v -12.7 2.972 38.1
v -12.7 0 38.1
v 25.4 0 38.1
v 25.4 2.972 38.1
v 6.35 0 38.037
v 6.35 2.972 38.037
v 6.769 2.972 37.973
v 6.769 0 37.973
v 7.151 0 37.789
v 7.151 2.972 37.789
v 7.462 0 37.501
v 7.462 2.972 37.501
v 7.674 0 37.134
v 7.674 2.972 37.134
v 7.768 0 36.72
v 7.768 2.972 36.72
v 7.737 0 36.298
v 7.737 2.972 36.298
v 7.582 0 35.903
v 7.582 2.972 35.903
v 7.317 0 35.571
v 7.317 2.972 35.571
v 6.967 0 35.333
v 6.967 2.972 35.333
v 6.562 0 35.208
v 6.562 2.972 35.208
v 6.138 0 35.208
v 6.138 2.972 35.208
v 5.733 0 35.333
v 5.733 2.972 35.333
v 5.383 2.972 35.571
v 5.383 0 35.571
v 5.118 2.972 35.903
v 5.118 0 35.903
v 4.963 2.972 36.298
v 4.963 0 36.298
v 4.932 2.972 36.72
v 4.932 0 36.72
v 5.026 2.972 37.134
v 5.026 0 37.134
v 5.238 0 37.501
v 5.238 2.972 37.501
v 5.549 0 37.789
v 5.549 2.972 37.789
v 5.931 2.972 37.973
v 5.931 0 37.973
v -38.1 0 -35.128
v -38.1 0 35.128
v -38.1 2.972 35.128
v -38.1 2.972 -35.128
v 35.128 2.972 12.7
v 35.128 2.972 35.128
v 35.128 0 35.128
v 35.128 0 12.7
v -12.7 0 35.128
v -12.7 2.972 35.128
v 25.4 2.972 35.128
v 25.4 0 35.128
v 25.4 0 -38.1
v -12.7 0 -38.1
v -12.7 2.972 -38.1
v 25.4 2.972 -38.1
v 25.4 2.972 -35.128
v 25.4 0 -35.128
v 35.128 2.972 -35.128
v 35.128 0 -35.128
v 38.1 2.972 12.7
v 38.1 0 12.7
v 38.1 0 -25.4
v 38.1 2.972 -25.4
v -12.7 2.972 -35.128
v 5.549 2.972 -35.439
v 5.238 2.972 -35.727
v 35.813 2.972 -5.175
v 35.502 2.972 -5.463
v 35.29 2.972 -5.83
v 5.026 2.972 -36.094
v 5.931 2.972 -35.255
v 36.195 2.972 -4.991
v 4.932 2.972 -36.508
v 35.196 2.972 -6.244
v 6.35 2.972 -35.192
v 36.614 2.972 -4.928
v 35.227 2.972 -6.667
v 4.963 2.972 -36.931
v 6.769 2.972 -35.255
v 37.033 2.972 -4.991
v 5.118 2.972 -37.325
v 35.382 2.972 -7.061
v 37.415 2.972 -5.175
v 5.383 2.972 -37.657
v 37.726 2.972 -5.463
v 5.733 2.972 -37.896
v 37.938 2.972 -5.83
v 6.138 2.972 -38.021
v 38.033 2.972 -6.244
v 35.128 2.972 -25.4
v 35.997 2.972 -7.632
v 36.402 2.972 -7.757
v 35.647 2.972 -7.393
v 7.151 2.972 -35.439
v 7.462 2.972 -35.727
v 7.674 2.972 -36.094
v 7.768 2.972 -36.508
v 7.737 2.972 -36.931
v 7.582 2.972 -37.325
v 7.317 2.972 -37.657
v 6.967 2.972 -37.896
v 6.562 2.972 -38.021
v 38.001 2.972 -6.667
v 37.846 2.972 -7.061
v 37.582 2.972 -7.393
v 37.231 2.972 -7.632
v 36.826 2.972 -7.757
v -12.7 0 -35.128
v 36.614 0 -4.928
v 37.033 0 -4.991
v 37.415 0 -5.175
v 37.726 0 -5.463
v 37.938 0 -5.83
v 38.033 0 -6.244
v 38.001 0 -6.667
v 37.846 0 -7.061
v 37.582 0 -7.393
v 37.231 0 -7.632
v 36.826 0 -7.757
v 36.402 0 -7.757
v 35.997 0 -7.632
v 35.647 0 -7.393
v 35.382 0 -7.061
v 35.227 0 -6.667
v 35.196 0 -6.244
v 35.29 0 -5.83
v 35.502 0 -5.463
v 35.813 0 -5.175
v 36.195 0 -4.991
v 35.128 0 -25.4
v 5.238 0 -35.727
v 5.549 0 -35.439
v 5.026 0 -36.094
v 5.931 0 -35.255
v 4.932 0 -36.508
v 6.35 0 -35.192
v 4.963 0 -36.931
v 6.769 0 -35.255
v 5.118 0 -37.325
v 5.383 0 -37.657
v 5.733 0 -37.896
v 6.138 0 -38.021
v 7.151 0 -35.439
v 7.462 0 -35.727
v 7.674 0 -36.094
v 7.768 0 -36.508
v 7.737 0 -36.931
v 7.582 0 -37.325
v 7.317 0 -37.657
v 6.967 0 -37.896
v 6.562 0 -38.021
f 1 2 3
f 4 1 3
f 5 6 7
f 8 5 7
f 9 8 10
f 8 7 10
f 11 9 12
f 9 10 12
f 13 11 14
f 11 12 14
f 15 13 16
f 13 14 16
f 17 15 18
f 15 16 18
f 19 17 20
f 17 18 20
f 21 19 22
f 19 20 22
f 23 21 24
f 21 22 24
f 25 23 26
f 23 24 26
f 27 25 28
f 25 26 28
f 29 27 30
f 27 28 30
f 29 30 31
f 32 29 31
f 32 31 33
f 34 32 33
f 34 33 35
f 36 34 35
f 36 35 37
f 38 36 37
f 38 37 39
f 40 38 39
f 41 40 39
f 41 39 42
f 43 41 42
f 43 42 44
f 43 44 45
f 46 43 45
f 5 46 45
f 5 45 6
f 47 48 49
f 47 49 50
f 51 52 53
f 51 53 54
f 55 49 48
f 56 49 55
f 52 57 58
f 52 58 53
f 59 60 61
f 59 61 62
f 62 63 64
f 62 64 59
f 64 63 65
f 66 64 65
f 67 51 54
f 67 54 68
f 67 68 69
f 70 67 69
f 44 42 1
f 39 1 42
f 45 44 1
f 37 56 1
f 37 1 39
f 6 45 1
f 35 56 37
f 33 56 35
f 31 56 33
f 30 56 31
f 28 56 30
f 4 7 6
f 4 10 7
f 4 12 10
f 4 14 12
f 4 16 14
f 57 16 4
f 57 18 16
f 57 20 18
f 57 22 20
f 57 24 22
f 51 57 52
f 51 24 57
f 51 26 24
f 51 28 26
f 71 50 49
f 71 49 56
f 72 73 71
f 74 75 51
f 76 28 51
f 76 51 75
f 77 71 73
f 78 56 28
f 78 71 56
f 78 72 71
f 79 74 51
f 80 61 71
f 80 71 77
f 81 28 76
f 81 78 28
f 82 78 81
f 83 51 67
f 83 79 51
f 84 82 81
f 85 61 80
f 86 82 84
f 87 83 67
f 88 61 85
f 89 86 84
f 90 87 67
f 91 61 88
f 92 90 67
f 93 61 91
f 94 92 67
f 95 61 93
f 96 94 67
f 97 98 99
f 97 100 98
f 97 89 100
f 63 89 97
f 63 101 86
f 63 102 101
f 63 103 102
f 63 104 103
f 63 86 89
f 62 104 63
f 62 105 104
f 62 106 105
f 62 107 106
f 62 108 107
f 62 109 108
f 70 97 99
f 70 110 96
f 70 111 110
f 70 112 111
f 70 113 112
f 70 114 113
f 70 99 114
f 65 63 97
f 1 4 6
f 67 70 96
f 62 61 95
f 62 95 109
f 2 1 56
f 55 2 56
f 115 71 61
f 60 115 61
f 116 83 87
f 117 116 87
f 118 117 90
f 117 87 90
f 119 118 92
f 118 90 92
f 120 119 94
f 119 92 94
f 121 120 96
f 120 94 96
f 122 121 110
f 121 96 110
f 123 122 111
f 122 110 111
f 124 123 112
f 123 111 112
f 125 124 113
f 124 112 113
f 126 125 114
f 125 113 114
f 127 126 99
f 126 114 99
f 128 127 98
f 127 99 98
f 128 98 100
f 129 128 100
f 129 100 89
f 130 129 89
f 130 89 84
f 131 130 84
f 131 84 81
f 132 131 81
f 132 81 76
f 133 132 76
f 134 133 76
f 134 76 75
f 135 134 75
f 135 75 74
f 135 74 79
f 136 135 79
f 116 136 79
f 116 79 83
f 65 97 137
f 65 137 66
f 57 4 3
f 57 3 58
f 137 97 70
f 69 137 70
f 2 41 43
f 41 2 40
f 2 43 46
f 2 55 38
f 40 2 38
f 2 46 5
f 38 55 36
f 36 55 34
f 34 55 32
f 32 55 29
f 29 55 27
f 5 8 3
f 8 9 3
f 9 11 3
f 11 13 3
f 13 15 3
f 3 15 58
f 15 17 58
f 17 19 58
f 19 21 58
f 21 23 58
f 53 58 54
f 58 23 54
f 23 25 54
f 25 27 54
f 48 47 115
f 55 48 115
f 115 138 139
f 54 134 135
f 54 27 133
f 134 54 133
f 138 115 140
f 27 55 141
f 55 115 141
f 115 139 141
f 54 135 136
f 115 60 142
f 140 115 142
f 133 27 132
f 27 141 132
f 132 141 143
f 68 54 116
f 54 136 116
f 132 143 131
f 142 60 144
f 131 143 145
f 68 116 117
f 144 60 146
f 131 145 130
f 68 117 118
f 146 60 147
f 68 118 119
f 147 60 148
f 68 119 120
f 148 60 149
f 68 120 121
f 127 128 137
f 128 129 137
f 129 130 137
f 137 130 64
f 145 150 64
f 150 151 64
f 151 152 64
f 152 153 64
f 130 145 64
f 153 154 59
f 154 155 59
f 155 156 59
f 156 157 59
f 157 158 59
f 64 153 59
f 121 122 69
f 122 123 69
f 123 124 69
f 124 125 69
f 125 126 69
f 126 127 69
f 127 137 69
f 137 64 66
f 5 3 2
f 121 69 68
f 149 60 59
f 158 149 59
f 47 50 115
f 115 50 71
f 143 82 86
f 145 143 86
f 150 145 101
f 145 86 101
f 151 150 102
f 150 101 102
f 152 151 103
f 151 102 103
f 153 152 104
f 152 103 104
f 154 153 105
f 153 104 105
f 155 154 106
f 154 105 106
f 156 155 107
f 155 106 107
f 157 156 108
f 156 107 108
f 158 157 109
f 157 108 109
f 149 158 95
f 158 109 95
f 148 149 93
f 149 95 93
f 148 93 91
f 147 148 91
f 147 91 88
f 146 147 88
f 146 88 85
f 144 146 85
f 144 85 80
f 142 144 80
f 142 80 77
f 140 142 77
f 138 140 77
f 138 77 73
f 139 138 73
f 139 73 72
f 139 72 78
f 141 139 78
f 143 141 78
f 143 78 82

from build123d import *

# Parameters (mm, degrees)
SKETCH1_W           = 76.2
SKETCH1_H           = 76.2
BOSS_EXTRUDE1_DEPTH = 2.9718
SKETCH2_W           = 25.4
SKETCH2_H           = 2.9718
SKETCH2_W_2         = 12.7
SKETCH2_W_3         = 2.9718
SKETCH2_H_2         = 12.7
SKETCH2_H_3         = 25.4
SKETCH2_R           = 1.4224
CUT_EXTRUDE1_DEPTH  = 54.963428313


with BuildPart() as part:
    # Sketch1 → Boss-Extrude1 (new body)
    with BuildSketch(Plane(origin=(0, 0, 0), x_dir=(1, 0, 0), z_dir=(0, 1, 0))):
        Rectangle(SKETCH1_W, SKETCH1_H)
    extrude(amount=BOSS_EXTRUDE1_DEPTH)

    # Sketch2 → Cut-Extrude1 (cut, through all)
    with BuildSketch(Plane(origin=(0, 2.9718, 0), x_dir=(1, 0, 0), z_dir=(0, 1, 0))):
        with Locations((-25.4, 36.6141)):
            Rectangle(SKETCH2_W, SKETCH2_H)
        with Locations((31.75, 36.6141)):
            Rectangle(SKETCH2_W_2, SKETCH2_H)
        with Locations((36.6141, 31.75)):
            Rectangle(SKETCH2_W_3, SKETCH2_H_2)
        with Locations((36.6141, -25.4)):
            Rectangle(SKETCH2_W_3, SKETCH2_H_3)
        with Locations(Location((36.6141, 6.35, 0), (0, 0, 270))):
            Circle(SKETCH2_R)
        with Locations(Location((6.35, 36.6141, 0), (0, 0, 270))):
            Circle(SKETCH2_R)
        with Locations((31.75, -36.6141)):
            Rectangle(SKETCH2_W_2, SKETCH2_H)
        with Locations(Location((6.35, -36.6141, 0), (0, 0, 270))):
            Circle(SKETCH2_R)
        with Locations((-25.4, -36.6141)):
            Rectangle(SKETCH2_W, SKETCH2_H)
    extrude(amount=-CUT_EXTRUDE1_DEPTH, mode=Mode.SUBTRACT)


solid = part.part
